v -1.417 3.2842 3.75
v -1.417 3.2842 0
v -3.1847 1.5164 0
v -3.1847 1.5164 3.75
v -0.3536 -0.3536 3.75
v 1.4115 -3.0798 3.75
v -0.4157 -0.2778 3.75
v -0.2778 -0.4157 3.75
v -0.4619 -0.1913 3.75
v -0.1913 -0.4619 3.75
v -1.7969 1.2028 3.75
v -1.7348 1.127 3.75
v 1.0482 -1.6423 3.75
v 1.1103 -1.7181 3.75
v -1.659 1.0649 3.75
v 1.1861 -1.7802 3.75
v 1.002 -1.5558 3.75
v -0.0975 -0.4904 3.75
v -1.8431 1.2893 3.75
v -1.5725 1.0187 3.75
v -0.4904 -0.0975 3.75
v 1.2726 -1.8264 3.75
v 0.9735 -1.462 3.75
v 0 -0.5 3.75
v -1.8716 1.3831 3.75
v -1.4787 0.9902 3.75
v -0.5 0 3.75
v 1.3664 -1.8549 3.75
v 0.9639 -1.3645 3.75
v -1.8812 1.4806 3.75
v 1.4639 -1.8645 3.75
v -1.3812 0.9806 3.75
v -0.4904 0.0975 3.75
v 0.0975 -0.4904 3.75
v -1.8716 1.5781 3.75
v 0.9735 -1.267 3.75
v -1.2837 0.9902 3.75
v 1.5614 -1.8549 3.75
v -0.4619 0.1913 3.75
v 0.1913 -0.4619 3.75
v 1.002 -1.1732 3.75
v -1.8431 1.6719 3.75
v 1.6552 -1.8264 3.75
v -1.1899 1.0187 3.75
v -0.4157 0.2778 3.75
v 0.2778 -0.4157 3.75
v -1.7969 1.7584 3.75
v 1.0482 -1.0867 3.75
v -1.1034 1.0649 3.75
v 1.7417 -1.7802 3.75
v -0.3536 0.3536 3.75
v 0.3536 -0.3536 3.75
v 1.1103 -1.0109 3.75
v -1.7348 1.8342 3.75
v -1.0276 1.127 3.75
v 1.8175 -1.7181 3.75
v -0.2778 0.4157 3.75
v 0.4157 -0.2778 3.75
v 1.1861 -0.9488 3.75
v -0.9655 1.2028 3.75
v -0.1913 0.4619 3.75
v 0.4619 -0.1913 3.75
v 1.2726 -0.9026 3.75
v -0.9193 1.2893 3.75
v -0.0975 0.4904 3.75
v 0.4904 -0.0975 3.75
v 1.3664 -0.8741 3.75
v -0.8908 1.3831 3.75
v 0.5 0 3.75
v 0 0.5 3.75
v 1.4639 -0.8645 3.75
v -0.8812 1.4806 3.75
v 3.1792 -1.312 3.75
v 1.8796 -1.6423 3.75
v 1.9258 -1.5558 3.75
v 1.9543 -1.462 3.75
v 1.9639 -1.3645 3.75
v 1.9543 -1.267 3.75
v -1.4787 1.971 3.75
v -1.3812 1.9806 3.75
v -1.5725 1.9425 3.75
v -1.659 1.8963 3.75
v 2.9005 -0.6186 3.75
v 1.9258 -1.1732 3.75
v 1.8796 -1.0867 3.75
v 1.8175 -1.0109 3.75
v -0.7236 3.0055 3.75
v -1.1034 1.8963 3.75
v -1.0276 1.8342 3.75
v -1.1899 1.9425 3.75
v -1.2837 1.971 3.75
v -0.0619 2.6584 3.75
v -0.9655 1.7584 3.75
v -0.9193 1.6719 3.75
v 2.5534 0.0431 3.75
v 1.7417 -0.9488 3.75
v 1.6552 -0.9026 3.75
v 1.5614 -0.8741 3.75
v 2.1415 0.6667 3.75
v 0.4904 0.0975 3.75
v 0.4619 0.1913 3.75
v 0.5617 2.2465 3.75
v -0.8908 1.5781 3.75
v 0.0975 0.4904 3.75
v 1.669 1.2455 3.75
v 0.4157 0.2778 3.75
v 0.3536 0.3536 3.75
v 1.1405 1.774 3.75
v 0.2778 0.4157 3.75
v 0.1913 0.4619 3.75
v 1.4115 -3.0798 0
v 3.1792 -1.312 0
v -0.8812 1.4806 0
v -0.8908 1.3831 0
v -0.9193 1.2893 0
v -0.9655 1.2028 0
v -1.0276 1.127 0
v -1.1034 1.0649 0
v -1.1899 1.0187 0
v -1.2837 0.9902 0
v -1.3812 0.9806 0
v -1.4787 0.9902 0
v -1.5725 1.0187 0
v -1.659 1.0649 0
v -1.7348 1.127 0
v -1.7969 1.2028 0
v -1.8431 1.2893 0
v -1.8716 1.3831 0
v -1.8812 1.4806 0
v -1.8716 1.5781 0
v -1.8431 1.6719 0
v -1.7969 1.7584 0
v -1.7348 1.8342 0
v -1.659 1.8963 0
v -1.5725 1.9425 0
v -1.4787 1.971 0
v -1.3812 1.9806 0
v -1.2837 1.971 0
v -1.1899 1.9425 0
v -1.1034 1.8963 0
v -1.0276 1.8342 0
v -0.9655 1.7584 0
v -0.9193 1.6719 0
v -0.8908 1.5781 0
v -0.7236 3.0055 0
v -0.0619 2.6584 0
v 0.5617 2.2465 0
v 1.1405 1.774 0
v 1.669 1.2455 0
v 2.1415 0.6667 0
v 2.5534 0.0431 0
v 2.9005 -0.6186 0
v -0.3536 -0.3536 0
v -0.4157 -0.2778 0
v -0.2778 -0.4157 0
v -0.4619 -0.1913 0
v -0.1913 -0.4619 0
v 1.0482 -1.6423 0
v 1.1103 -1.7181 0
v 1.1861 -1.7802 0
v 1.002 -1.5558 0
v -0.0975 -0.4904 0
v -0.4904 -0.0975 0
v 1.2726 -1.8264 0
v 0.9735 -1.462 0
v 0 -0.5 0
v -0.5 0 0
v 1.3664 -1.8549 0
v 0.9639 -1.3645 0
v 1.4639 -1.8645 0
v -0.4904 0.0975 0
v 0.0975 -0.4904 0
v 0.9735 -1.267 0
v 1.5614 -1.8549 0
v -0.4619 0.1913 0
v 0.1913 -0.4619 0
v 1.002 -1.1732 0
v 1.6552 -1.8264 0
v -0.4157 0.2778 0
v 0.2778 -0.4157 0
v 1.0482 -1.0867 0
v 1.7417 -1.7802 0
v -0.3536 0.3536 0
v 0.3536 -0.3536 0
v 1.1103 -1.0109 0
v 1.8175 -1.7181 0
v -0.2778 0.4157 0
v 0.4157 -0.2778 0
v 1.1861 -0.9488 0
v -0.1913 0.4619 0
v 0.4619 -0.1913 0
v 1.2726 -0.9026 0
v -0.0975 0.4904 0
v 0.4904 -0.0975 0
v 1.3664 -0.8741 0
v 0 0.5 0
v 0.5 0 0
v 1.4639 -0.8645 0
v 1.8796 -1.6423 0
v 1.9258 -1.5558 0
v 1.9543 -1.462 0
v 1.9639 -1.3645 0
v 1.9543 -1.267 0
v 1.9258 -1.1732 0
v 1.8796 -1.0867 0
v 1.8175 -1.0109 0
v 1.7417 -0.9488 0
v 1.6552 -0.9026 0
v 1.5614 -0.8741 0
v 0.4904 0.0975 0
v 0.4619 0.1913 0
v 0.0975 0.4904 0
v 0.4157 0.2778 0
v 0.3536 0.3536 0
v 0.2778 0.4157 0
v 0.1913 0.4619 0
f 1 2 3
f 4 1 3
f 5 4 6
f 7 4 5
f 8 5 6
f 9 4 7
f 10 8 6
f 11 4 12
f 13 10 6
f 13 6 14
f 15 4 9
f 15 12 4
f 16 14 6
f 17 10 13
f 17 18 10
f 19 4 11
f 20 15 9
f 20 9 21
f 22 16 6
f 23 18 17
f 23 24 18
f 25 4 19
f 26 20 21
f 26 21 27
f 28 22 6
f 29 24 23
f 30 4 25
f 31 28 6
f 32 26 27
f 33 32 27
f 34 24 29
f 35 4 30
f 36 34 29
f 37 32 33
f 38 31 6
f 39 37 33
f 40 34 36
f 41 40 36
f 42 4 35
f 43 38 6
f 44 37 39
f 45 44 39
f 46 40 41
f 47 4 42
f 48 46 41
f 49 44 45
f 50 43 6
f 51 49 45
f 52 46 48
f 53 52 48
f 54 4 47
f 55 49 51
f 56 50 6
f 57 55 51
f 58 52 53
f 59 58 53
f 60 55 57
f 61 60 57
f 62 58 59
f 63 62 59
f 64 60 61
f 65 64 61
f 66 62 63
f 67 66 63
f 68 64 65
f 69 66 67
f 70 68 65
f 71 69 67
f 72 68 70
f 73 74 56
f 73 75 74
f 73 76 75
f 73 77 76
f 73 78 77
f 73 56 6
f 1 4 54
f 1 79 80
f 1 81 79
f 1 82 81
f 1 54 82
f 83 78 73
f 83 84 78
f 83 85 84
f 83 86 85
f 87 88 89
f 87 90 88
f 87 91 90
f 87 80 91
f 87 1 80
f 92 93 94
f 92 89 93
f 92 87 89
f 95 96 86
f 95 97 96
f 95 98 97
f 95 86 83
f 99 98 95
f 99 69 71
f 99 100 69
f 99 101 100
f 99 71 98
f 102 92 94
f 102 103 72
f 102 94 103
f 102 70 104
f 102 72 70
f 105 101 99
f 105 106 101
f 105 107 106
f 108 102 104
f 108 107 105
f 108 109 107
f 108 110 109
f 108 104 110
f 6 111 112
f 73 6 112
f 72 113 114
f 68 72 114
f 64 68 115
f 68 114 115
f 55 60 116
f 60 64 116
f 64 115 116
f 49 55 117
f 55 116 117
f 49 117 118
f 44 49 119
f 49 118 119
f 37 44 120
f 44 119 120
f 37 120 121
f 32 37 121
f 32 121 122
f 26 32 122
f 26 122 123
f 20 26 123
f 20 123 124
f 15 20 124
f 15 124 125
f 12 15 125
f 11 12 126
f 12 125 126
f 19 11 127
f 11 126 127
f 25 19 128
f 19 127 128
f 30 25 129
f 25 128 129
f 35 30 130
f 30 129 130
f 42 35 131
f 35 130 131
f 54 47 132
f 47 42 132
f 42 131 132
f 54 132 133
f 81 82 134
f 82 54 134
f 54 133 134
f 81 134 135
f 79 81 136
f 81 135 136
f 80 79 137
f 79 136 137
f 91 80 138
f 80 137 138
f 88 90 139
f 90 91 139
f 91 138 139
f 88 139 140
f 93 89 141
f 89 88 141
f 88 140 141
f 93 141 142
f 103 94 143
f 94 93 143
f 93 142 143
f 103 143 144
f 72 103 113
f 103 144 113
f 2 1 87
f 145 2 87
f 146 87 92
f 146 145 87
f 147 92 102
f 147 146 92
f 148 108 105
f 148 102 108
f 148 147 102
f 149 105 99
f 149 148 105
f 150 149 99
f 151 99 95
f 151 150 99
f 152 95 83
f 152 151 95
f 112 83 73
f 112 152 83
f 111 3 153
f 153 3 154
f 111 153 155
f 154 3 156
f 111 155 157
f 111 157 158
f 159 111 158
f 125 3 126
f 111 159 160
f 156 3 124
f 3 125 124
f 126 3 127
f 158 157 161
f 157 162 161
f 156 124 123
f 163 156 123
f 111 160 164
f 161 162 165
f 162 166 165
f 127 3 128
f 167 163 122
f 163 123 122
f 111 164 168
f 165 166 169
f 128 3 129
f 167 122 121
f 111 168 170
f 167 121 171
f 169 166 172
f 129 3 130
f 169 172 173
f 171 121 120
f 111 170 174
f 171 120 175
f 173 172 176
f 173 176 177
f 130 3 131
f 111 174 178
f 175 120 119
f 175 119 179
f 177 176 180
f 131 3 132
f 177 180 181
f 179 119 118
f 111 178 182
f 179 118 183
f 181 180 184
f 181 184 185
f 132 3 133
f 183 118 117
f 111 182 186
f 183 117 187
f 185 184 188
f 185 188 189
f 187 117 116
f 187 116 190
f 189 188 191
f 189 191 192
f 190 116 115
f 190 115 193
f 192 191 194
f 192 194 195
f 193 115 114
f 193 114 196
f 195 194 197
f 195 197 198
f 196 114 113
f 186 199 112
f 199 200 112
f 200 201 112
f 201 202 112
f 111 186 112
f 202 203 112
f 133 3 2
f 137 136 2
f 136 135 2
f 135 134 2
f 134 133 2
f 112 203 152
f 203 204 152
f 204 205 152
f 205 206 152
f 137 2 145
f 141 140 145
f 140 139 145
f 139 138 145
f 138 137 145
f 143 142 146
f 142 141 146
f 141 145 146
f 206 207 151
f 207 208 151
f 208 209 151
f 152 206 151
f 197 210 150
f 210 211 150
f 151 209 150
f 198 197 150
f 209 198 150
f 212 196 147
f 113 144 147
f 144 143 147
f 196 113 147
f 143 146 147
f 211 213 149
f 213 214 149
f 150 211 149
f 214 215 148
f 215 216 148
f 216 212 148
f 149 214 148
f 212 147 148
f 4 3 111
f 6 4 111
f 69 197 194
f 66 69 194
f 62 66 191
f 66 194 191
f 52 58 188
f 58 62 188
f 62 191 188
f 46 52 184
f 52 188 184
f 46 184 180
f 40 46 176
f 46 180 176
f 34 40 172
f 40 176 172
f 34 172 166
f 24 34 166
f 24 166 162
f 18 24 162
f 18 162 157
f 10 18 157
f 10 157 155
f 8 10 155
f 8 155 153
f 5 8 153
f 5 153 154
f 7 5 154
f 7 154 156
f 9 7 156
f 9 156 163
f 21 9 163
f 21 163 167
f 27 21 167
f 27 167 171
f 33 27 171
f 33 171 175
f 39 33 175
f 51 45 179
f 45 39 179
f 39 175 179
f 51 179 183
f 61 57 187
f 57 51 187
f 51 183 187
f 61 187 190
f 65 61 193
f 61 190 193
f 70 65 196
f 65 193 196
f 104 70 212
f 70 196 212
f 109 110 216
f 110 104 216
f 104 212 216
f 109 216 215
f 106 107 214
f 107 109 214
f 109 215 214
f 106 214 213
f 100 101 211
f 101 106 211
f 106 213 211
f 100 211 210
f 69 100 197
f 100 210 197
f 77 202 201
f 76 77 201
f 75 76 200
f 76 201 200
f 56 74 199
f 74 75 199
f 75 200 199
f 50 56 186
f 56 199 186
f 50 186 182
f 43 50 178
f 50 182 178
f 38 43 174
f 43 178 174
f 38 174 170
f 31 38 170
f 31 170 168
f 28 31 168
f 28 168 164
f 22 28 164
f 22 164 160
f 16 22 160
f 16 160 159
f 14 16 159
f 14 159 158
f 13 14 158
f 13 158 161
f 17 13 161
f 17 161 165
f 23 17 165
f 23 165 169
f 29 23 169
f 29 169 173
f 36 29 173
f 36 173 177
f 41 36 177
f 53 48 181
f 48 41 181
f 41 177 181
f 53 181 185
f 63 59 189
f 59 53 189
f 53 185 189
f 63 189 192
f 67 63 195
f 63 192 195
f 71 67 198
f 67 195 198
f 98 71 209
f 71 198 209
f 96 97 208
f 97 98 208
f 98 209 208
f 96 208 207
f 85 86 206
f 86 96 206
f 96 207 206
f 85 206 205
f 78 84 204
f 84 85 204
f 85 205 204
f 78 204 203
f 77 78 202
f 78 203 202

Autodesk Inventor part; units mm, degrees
ref_plane "YZ Plane" through (0, 0, 0) normal (1, 0, 0) x (0, 1, 0)
ref_plane "XZ Plane" through (0, 0, 0) normal (0, 1, 0) x (-1, 0, 0)
ref_plane "XY Plane" through (0, 0, 0) normal (0, 0, 1) x (1, 0, 0)
sketch "Sketch1" plane through (0, 0, 0) normal (0, 0, 1) x (1, 0, 0)
  circle A0 centre (0, 0) radius 0.5 projected
  circle A1 centre (1.4639, -1.3645) radius 0.5 projected
  circle A2 centre (-1.3812, 1.4806) radius 0.5 projected
  circle A3 centre (4.5267, -2.6595) radius 0.5 projected
  circle A4 centre (6.5905, -2.6595) radius 0.5 projected
  circle A5 centre (8.6472, -2.6595) radius 0.5 projected
  line L0 (1.4639, -1.3645) -> (-1.3812, 1.4806) construction
  line L1 (-3.1847, 1.5164) -> (1.4115, -3.0798)
  line L2 (1.4115, -3.0798) -> (3.1792, -1.312)
  line L3 (3.1792, -1.312) -> (-1.417, 3.2842) construction
  line L4 (-1.417, 3.2842) -> (-3.1847, 1.5164)
  arc A6 (3.1792, -1.312) -> (-1.417, 3.2842) centre (-3.8329, -3.728) ccw
  point P0 (0, 0)
  dimension "d0" = 2.5
  dimension "d1" = 6.5
extrude "Extrusion1" add sketch "Sketch1" along normal blind 3.75 contours L4 A6 L2 L1
properties part number "encoder_sensor"
